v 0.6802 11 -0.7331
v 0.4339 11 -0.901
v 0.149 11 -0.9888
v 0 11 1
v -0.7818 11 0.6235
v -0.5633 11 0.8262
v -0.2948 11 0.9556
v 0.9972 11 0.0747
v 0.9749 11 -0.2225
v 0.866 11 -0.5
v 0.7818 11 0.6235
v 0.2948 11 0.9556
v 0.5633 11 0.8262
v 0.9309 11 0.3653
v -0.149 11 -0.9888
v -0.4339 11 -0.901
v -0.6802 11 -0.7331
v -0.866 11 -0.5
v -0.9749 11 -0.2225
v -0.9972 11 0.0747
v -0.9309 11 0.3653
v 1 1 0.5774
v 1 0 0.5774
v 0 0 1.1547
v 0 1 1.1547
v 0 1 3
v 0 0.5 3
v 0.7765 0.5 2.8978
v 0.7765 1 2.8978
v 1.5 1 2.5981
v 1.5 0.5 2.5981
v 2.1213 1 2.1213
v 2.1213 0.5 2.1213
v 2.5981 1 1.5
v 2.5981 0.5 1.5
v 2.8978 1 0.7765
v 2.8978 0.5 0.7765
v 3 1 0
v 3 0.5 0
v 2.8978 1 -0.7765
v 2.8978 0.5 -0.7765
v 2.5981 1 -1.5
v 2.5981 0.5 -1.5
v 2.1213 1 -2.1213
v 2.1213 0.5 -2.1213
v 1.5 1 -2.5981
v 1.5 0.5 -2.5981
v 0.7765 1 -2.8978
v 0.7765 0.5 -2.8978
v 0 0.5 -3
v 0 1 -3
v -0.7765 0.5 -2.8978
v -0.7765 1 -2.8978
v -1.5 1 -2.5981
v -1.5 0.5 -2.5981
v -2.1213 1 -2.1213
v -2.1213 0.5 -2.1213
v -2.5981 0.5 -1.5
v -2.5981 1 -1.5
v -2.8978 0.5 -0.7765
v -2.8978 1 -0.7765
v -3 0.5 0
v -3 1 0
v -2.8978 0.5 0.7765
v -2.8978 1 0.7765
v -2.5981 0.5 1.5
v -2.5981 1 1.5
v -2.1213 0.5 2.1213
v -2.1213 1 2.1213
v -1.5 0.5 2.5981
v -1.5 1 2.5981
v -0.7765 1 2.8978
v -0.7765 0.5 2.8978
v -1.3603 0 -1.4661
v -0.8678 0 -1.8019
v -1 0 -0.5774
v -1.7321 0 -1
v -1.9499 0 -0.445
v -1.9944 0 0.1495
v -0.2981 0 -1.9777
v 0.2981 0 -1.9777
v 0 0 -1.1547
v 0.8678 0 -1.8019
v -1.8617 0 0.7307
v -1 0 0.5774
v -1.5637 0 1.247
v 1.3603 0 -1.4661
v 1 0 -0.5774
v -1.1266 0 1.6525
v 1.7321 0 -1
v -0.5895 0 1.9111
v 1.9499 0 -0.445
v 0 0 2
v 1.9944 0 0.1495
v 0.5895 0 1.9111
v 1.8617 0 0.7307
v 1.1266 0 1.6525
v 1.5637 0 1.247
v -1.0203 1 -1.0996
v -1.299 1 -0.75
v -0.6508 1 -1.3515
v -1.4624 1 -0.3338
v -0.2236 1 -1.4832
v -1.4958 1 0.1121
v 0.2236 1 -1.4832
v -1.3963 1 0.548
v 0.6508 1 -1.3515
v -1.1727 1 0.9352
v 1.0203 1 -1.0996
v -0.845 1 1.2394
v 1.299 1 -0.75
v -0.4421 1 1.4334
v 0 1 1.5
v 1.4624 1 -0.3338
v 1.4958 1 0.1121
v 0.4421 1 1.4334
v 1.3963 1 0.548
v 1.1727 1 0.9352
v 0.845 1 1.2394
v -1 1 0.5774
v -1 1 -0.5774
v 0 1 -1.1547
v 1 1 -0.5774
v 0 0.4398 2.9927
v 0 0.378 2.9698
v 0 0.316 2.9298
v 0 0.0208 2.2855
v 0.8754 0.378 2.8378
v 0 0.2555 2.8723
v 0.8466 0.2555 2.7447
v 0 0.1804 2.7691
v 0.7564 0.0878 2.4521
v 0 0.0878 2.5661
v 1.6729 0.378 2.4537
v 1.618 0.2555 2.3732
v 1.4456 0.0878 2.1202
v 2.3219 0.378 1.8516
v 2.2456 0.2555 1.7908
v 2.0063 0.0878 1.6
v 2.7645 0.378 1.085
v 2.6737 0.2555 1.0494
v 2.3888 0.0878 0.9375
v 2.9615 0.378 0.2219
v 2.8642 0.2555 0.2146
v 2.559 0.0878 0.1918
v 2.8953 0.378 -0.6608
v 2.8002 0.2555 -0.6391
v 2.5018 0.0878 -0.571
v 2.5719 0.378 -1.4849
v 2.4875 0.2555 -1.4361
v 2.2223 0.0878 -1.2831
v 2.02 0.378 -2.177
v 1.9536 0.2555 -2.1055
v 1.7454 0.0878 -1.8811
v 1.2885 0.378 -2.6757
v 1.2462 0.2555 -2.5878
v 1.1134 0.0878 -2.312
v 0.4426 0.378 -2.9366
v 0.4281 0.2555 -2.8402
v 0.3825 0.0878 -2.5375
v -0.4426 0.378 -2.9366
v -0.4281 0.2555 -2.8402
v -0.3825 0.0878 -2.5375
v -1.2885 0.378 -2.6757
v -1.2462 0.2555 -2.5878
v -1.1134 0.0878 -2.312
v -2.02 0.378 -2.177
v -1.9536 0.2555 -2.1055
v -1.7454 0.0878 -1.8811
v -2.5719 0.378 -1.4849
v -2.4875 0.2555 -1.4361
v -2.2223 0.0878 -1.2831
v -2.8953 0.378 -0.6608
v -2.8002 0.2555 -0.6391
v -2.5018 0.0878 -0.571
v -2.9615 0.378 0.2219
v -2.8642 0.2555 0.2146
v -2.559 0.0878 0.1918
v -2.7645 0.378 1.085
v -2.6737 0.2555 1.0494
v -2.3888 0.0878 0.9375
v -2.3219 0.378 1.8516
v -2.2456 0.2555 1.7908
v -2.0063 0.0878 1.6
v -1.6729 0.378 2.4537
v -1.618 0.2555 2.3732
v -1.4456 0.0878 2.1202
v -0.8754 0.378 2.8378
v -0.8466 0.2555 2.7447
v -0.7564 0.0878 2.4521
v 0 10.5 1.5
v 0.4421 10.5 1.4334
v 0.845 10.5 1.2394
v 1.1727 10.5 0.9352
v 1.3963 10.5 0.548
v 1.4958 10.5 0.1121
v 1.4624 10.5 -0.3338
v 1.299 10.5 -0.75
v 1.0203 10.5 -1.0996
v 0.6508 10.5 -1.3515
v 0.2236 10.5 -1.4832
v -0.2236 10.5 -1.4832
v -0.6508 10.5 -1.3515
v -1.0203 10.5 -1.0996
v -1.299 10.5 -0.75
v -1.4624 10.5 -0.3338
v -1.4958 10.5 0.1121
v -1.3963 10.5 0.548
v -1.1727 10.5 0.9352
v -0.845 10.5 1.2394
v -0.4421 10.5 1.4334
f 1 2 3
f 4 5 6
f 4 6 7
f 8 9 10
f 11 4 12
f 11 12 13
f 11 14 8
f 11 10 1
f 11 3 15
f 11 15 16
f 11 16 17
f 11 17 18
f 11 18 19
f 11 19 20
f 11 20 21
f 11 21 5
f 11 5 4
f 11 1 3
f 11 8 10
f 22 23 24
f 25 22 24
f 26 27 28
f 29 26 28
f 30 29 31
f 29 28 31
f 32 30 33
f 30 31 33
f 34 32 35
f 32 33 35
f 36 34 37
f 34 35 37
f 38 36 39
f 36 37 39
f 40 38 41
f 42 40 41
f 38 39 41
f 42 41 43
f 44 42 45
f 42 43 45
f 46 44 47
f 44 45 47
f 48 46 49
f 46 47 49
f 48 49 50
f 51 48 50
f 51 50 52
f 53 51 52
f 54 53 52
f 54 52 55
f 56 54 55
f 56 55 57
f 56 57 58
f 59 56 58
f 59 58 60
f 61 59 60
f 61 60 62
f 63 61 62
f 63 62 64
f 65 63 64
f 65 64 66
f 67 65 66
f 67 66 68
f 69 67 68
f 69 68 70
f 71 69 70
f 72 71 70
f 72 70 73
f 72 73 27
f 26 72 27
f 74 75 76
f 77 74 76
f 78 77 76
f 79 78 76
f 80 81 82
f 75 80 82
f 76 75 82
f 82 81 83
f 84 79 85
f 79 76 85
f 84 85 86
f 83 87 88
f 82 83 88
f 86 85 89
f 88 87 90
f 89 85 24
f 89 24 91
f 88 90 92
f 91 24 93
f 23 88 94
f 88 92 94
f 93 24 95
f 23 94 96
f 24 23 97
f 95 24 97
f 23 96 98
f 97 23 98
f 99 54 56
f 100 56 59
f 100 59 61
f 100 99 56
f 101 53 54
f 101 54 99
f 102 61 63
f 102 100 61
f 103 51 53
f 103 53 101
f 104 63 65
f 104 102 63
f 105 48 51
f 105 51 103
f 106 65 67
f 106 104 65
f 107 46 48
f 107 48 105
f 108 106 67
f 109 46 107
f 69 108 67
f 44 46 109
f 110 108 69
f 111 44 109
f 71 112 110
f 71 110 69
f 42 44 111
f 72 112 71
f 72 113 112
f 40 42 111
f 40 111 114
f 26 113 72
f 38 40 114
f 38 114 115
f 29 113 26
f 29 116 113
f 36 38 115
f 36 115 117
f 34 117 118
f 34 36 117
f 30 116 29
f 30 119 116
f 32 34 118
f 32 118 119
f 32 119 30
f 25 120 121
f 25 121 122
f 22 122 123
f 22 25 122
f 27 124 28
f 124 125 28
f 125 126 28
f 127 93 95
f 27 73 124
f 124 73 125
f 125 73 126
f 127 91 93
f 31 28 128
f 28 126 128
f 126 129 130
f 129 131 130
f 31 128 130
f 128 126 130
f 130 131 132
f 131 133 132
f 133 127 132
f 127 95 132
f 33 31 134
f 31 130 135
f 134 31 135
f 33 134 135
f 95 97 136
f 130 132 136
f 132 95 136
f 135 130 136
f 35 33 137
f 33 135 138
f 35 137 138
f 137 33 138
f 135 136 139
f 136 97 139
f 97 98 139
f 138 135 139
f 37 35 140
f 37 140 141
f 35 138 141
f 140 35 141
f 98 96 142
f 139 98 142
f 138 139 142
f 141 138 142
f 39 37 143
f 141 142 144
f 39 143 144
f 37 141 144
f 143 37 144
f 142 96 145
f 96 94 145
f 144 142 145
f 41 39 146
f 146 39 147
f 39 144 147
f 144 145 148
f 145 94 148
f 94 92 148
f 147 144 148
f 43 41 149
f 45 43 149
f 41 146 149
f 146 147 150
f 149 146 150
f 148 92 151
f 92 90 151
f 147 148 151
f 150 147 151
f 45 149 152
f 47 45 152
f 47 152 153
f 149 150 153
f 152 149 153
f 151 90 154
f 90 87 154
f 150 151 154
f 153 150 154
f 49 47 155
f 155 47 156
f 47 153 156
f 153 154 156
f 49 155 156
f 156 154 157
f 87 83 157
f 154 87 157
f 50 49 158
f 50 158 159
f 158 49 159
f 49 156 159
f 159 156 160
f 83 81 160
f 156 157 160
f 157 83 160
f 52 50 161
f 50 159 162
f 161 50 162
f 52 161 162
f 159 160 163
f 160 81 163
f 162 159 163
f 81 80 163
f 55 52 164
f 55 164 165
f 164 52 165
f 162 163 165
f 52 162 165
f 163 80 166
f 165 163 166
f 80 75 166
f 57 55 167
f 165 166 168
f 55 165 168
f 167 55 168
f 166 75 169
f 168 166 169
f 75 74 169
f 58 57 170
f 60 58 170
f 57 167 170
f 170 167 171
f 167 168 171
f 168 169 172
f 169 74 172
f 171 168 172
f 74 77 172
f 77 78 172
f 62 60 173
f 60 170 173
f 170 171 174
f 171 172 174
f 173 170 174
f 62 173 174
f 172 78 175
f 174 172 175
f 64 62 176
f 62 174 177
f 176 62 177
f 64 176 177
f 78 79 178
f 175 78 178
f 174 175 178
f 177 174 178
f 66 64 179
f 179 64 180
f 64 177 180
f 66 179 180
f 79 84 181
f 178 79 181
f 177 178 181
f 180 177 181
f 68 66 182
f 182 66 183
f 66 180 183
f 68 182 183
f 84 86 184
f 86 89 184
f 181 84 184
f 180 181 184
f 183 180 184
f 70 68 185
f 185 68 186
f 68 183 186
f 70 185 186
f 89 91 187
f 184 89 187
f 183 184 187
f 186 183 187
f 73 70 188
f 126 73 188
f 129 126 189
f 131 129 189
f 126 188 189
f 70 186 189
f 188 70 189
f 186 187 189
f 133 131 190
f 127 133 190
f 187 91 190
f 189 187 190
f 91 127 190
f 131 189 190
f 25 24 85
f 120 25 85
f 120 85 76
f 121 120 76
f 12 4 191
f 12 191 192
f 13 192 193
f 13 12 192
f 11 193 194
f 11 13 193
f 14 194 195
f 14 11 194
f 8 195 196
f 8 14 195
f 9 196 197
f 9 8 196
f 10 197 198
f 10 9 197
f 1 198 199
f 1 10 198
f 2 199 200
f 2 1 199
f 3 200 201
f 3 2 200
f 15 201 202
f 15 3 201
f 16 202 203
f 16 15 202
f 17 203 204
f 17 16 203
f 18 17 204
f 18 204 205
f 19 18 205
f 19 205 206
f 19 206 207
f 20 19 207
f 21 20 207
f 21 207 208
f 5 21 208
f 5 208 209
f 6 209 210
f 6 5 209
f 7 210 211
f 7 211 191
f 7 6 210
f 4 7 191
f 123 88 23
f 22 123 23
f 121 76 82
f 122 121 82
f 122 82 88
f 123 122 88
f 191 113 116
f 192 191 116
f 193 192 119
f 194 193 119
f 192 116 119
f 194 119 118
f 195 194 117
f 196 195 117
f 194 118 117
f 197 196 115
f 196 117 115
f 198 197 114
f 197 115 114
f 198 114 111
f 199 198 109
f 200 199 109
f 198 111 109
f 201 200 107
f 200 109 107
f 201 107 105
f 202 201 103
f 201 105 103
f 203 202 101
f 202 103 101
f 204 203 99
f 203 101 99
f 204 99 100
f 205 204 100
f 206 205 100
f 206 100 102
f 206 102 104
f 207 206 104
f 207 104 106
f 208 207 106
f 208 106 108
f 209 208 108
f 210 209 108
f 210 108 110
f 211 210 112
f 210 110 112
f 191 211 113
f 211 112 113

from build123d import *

# Parameters (mm, degrees)
SKETCH_1_R          = 3
EXTRUDE_1_DEPTH     = 1
SKETCH_2_R          = 1.5
EXTRUDE_2_DEPTH     = 10
CUT_EXTRUDE_1_DEPTH = 1
FILLET_1_SIZE       = 0.5
FILLET_1_SIZE_2     = 1
CHAMFER_1_SIZE      = 0.5


with BuildPart() as part:
    # 草图1 → 凸台-拉伸1 (new body)
    with BuildSketch(Plane(origin=(0, 0, 0), x_dir=(1, 0, 0), z_dir=(0, 1, 0))):
        with Locations(Location((0, 0, 0), (0, 0, 270))):
            Circle(SKETCH_1_R)
    extrude(amount=EXTRUDE_1_DEPTH)

    # 草图2 → 凸台-拉伸2 (add)
    with BuildSketch(Plane(origin=(0, 1, 0), x_dir=(1, 0, 0), z_dir=(0, 1, 0))):
        with Locations(Location((0, 0, 0), (0, 0, 270))):
            Circle(SKETCH_2_R)
    extrude(amount=EXTRUDE_2_DEPTH)

    # 草图3 → 切除-拉伸1 (cut)
    with BuildSketch(Plane.XZ):
        Polygon((0, 1.154700538), (-1, 0.577350269), (-1, -0.577350269), (0, -1.154700538), (1, -0.577350269), (1, 0.577350269), align=None)
    extrude(amount=-CUT_EXTRUDE_1_DEPTH, mode=Mode.SUBTRACT)

    # 圆角1
    # an asymmetric fillet: 1, 0.5 mm, written as the material it takes off along each edge
    with BuildSketch(Plane(origin=(0, 0, 0), x_dir=(0, 0, 1), z_dir=(-1, 0, 0))) as fillet_1_piece_1:
        with BuildLine():
            Bezier((3, FILLET_1_SIZE), (3, 0), (3 - FILLET_1_SIZE_2, 0), weights=[1, 0.707106781, 1])
            Line((3 - FILLET_1_SIZE_2, 0), (3, 0))
            Line((3, 0), (3, FILLET_1_SIZE))
        make_face()
    revolve(axis=Axis((0, 0, 0), (0, 1, 0)), mode=Mode.SUBTRACT)

    # 倒角1
    chamfer_1_edges = [part.edges().sort_by_distance(p)[0] for p in [
        (0, 11, -1.5),
    ]]
    chamfer(chamfer_1_edges, length=CHAMFER_1_SIZE)


solid = part.part
